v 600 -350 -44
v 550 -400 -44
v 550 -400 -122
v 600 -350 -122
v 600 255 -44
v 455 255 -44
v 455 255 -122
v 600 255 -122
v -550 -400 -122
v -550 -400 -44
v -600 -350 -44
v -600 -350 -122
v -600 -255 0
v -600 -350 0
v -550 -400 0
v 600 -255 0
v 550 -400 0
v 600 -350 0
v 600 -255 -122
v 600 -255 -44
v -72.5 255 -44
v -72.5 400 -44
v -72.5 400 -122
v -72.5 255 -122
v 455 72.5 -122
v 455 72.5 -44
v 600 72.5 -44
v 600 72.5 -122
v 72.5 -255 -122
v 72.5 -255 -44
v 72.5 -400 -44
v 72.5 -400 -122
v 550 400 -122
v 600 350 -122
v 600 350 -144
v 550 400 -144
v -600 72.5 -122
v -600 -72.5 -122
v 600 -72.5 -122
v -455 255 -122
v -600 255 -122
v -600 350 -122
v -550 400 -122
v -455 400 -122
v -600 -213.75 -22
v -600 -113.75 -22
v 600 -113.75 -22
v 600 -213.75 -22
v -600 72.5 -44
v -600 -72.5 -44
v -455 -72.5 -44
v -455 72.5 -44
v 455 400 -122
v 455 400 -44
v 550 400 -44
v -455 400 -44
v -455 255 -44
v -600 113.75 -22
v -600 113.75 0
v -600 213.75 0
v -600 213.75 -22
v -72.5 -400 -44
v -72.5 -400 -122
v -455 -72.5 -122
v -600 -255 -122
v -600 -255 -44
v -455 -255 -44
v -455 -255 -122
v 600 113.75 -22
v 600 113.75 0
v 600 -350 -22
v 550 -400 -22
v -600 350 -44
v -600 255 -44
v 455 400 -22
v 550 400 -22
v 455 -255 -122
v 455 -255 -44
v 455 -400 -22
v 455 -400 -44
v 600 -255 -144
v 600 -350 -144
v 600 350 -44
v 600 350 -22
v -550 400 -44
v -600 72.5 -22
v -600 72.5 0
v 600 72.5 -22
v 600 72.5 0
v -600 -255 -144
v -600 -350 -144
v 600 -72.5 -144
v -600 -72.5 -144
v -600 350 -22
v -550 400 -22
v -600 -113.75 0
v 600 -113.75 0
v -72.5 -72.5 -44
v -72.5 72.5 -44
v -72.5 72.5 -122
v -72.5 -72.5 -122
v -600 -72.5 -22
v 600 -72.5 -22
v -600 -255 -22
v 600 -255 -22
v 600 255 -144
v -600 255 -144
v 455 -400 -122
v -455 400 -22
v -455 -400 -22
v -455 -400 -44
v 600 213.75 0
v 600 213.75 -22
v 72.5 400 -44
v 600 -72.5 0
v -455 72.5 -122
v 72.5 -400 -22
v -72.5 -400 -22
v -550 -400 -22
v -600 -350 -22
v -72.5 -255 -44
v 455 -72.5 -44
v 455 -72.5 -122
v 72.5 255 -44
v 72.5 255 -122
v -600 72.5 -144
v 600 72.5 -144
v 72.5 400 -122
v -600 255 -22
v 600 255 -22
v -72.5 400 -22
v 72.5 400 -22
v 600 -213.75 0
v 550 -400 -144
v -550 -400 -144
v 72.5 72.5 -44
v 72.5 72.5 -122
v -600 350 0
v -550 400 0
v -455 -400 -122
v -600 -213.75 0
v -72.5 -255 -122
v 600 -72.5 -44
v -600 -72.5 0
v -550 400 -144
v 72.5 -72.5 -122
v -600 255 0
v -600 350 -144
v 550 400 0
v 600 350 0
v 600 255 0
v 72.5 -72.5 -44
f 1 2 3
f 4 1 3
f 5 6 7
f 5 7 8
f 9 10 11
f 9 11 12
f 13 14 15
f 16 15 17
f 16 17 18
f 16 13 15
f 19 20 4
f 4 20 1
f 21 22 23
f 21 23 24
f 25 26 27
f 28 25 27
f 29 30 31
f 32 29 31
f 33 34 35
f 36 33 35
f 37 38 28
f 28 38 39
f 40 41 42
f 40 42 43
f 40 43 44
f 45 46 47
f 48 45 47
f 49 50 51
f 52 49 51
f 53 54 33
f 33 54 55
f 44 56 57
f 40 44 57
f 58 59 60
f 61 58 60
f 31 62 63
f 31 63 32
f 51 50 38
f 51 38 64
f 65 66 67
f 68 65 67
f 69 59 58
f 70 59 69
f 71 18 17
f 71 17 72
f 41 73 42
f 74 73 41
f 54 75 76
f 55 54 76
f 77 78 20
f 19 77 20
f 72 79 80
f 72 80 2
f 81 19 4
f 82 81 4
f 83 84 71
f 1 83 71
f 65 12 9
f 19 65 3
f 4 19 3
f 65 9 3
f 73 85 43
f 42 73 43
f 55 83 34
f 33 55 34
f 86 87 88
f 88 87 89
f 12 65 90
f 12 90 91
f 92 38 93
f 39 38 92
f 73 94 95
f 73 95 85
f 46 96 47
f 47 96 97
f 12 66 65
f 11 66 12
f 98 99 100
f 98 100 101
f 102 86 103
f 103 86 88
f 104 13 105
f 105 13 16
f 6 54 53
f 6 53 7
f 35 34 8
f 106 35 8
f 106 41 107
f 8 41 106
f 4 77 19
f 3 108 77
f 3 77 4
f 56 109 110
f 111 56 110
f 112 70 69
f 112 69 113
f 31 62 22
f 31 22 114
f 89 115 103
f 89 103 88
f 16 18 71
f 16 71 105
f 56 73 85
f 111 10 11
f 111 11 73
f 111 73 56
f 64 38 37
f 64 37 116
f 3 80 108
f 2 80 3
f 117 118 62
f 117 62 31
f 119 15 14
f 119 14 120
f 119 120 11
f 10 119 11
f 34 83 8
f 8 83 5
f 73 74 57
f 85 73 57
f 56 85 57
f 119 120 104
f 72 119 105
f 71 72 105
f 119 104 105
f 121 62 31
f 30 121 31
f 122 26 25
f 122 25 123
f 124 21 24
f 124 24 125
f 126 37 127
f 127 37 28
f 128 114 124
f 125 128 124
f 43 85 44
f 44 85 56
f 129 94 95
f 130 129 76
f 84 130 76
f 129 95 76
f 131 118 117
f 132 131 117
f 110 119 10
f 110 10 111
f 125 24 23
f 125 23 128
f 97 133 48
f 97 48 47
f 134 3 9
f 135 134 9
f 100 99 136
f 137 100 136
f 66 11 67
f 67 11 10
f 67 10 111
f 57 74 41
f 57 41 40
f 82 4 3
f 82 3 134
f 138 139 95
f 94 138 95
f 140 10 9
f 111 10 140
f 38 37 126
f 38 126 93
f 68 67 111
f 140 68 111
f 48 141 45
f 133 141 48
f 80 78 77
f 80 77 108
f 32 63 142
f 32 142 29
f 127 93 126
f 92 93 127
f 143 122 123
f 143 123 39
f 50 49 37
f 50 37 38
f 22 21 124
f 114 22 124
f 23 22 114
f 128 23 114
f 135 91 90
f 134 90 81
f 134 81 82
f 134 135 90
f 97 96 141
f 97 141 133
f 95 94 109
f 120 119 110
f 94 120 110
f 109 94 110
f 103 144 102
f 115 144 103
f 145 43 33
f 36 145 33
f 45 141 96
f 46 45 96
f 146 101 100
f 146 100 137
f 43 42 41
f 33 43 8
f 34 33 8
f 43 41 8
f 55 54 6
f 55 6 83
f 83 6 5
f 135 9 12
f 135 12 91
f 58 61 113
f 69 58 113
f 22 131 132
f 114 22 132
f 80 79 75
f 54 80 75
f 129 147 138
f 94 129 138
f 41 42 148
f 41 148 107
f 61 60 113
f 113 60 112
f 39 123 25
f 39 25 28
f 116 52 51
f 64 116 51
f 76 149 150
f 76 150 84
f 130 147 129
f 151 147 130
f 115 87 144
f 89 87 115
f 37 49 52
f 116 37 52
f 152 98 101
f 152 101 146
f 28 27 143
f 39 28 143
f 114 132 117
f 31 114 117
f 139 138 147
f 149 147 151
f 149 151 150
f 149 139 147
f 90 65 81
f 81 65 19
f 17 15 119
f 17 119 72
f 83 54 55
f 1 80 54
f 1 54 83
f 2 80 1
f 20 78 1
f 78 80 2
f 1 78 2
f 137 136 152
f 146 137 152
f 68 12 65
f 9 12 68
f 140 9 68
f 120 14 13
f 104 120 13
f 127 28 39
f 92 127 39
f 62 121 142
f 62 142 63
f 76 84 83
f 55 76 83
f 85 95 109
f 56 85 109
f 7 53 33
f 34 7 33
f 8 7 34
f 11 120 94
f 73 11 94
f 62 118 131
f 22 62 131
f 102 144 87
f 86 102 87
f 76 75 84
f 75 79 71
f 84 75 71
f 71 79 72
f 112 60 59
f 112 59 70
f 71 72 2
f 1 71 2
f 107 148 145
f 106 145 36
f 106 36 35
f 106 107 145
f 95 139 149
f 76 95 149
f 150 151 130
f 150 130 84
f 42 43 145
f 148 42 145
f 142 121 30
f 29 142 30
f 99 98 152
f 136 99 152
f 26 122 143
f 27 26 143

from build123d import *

# Parameters (mm, degrees)
F0_W      = 1200
F0_H      = 145
F0_H_2    = 100
F1_DEPTH  = 22
F2_W      = 145
F2_H      = 655
F2_H_2    = 145
F3_DEPTH  = 22
F4_W      = 145
F4_H      = 145
F5_DEPTH  = 78
F6_W      = 145
F6_H      = 145
F6_W_2    = 1055
F6_W_3    = 1200
F7_DEPTH  = 22
F8_SIZE   = 50
F8_2_SIZE = 50
F8_3_SIZE = 50
F8_4_SIZE = 50


with BuildPart() as f1:
    # F0 (on Top) → F1 (new body)
    with BuildSketch(Plane.XY):
        with Locations((0, 327.5)):
            Rectangle(F0_W, F0_H)
        with Locations((0, 163.75)):
            Rectangle(F0_W, F0_H_2)
        Rectangle(F0_W, F0_H)
        with Locations((0, -163.75)):
            Rectangle(F0_W, F0_H_2)
        with Locations((0, -327.5)):
            Rectangle(F0_W, F0_H)
    extrude(amount=-F1_DEPTH)

    # F8
    f8_edges = [f1.edges().sort_by_distance(p)[0] for p in [
        (-600, -400, -11),
        (600, -400, -11),
        (600, 400, -11),
        (-600, 400, -11),
    ]]
    chamfer(f8_edges, length=F8_SIZE)


with BuildPart() as f3:
    # F2 (on face) → F3 (new body)
    with BuildSketch(Plane(origin=(0, 0, -22), x_dir=(1, 0, 0), z_dir=(0, 0, -1))):
        with Locations((-527.5, -72.5)):
            Rectangle(F2_W, F2_H)
        with Locations((-527.5, 327.5)):
            Rectangle(F2_W, F2_H_2)
        with Locations((0, 327.5)):
            Rectangle(F2_W, F2_H_2)
        with Locations((0, -72.5)):
            Rectangle(F2_W, F2_H)
        with Locations((527.5, 327.5)):
            Rectangle(F2_W, F2_H_2)
        with Locations((527.5, -72.5)):
            Rectangle(F2_W, F2_H)
    extrude(amount=F3_DEPTH)

    # F8#2
    f8_2_edges = [f3.edges().sort_by_distance(p)[0] for p in [
        (-600, -400, -33),
        (600, -400, -33),
        (600, 400, -33),
        (-600, 400, -33),
    ]]
    chamfer(f8_2_edges, length=F8_2_SIZE)


with BuildPart() as f5:
    # F4 (on face) → F5 (new body)
    with BuildSketch(Plane(origin=(0, 0, -44), x_dir=(1, 0, 0), z_dir=(0, 0, -1))):
        with Locations((-527.5, 327.5)):
            Rectangle(F4_W, F4_H)
        with Locations((-527.5, 0)):
            Rectangle(F4_W, F4_H)
        with Locations((-527.5, -327.5)):
            Rectangle(F4_W, F4_H)
        with Locations((0, -327.5)):
            Rectangle(F4_W, F4_H)
        Rectangle(F4_W, F4_H)
        with Locations((0, 327.5)):
            Rectangle(F4_W, F4_H)
        with Locations((527.5, 327.5)):
            Rectangle(F4_W, F4_H)
        with Locations((527.5, 0)):
            Rectangle(F4_W, F4_H)
        with Locations((527.5, -327.5)):
            Rectangle(F4_W, F4_H)
    extrude(amount=F5_DEPTH)

    # F8#3
    f8_3_edges = [f5.edges().sort_by_distance(p)[0] for p in [
        (-600, -400, -83),
        (600, -400, -83),
        (600, 400, -83),
        (-600, 400, -83),
    ]]
    chamfer(f8_3_edges, length=F8_3_SIZE)


with BuildPart() as f7:
    # F6 (on face) → F7 (new body)
    with BuildSketch(Plane(origin=(0, 0, -122), x_dir=(1, 0, 0), z_dir=(0, 0, -1))):
        with Locations((-527.5, 327.5)):
            Rectangle(F6_W, F6_H)
        with Locations((72.5, 327.5)):
            Rectangle(F6_W_2, F6_H)
        Rectangle(F6_W_3, F6_H)
        with Locations((0, -327.5)):
            Rectangle(F6_W_3, F6_H)
    extrude(amount=F7_DEPTH)

    # F8#4
    f8_4_edges = [f7.edges().sort_by_distance(p)[0] for p in [
        (-600, -400, -133),
        (600, -400, -133),
        (600, 400, -133),
        (-600, 400, -133),
    ]]
    chamfer(f8_4_edges, length=F8_4_SIZE)


solid = Compound([f1.part, f3.part, f5.part, f7.part])
